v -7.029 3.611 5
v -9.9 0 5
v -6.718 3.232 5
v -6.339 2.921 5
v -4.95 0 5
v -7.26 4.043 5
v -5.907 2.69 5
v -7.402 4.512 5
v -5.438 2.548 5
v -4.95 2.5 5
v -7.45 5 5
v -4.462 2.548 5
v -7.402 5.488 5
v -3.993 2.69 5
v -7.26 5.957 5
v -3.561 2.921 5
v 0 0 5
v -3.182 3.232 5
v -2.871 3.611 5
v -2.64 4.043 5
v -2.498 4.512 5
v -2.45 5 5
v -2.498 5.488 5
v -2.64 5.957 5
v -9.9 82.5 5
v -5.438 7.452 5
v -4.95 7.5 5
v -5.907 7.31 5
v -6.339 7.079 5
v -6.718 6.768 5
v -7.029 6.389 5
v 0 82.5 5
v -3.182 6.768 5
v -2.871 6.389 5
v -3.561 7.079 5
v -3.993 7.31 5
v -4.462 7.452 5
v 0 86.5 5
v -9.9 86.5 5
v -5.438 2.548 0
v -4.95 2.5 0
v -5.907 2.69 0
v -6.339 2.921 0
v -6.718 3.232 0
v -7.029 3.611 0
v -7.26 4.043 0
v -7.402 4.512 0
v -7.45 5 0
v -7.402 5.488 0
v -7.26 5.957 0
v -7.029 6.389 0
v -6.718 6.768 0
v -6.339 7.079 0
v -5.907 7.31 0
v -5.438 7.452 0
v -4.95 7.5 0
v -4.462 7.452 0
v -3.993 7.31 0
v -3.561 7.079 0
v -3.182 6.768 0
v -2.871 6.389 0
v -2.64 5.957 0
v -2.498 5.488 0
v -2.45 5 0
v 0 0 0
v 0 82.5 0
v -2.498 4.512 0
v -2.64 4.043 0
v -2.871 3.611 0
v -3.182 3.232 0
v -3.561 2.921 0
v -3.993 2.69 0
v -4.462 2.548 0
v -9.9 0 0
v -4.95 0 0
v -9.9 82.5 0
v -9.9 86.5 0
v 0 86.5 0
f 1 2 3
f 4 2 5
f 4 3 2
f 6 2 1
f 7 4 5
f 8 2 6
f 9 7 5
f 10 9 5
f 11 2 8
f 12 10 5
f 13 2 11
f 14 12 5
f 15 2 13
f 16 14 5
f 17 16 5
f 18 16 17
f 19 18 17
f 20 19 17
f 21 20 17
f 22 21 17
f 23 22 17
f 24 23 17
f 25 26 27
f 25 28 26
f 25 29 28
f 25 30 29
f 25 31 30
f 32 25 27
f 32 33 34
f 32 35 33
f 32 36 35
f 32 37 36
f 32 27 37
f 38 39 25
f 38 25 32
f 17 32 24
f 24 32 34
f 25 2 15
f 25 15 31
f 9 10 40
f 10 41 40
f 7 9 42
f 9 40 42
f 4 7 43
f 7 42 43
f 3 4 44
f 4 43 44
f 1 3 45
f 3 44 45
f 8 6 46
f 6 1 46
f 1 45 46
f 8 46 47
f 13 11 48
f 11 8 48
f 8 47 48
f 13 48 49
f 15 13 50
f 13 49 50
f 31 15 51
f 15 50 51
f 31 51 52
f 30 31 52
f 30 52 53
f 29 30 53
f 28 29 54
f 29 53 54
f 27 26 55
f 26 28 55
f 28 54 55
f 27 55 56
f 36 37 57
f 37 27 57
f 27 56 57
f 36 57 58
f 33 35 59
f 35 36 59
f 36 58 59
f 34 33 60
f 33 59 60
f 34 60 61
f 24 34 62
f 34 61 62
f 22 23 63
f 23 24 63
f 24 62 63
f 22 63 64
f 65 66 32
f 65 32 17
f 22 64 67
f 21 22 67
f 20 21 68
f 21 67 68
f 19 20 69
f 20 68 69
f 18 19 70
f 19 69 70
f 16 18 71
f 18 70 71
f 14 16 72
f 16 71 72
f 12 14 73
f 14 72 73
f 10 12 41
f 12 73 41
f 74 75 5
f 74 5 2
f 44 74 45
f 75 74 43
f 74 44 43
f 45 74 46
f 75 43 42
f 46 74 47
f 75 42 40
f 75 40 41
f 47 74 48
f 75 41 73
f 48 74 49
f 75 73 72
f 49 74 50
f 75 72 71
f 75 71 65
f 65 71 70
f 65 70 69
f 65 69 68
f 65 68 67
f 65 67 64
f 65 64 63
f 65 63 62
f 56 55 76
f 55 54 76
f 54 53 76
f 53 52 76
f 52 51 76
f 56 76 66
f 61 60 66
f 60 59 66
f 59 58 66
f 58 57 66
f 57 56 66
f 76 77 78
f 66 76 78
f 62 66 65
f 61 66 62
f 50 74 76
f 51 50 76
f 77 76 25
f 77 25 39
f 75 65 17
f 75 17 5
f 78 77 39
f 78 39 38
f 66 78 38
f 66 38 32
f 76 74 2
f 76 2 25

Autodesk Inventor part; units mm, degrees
ref_plane "YZ Plane" through (0, 0, 0) normal (1, 0, 0) x (0, 1, 0)
ref_plane "XZ Plane" through (0, 0, 0) normal (0, 1, 0) x (-1, 0, 0)
ref_plane "XY Plane" through (0, 0, 0) normal (0, 0, 1) x (1, 0, 0)
sketch "Sketch2" plane through (0, 0, 0) normal (0, 0, 1) x (1, 0, 0)
  line L0 (0, 0) -> (-9.9, 0)
  line L1 (-4.95, 0) -> (-4.95, 2.5)
  line L2 (-4.95, 0) -> (-2.45, 0) construction
  circle A0 centre (-4.95, 5) radius 2.5
  line L3 (-4.95, 7.5) -> (32.05, 7.5) construction
  line L4 (0, 0) -> (-9.9, 0)
  line L5 (0, 0) -> (-9.9, 0)
  line L6 (-4.95, 7.5) -> (66.05, 7.5) construction
  line L7 (-4.95, 7.5) -> (70.05, 7.5) construction
  line L8 (0, 0) -> (-9.9, 0)
  line L9 (-9.9, 0) -> (-9.9, 82.5)
  line L10 (0, 82.5) -> (0, 0)
  line L11 (-4.95, 7.5) -> (74.05, 7.5) construction
  line L12 (-9.9, 86.5) -> (0, 86.5)
  line L13 (0, 86.5) -> (0, 82.5)
  line L14 (-9.9, 82.5) -> (-9.9, 86.5)
  dimension "d35" = 5
  dimension "d33" = 2.5
  dimension "d34" = 90
  dimension "d48" = 9.9
extrude "Extrusion7" add sketch "Sketch2" along normal blind 5
properties part number "Cube_Holder_SB_V1_(71mm)"
